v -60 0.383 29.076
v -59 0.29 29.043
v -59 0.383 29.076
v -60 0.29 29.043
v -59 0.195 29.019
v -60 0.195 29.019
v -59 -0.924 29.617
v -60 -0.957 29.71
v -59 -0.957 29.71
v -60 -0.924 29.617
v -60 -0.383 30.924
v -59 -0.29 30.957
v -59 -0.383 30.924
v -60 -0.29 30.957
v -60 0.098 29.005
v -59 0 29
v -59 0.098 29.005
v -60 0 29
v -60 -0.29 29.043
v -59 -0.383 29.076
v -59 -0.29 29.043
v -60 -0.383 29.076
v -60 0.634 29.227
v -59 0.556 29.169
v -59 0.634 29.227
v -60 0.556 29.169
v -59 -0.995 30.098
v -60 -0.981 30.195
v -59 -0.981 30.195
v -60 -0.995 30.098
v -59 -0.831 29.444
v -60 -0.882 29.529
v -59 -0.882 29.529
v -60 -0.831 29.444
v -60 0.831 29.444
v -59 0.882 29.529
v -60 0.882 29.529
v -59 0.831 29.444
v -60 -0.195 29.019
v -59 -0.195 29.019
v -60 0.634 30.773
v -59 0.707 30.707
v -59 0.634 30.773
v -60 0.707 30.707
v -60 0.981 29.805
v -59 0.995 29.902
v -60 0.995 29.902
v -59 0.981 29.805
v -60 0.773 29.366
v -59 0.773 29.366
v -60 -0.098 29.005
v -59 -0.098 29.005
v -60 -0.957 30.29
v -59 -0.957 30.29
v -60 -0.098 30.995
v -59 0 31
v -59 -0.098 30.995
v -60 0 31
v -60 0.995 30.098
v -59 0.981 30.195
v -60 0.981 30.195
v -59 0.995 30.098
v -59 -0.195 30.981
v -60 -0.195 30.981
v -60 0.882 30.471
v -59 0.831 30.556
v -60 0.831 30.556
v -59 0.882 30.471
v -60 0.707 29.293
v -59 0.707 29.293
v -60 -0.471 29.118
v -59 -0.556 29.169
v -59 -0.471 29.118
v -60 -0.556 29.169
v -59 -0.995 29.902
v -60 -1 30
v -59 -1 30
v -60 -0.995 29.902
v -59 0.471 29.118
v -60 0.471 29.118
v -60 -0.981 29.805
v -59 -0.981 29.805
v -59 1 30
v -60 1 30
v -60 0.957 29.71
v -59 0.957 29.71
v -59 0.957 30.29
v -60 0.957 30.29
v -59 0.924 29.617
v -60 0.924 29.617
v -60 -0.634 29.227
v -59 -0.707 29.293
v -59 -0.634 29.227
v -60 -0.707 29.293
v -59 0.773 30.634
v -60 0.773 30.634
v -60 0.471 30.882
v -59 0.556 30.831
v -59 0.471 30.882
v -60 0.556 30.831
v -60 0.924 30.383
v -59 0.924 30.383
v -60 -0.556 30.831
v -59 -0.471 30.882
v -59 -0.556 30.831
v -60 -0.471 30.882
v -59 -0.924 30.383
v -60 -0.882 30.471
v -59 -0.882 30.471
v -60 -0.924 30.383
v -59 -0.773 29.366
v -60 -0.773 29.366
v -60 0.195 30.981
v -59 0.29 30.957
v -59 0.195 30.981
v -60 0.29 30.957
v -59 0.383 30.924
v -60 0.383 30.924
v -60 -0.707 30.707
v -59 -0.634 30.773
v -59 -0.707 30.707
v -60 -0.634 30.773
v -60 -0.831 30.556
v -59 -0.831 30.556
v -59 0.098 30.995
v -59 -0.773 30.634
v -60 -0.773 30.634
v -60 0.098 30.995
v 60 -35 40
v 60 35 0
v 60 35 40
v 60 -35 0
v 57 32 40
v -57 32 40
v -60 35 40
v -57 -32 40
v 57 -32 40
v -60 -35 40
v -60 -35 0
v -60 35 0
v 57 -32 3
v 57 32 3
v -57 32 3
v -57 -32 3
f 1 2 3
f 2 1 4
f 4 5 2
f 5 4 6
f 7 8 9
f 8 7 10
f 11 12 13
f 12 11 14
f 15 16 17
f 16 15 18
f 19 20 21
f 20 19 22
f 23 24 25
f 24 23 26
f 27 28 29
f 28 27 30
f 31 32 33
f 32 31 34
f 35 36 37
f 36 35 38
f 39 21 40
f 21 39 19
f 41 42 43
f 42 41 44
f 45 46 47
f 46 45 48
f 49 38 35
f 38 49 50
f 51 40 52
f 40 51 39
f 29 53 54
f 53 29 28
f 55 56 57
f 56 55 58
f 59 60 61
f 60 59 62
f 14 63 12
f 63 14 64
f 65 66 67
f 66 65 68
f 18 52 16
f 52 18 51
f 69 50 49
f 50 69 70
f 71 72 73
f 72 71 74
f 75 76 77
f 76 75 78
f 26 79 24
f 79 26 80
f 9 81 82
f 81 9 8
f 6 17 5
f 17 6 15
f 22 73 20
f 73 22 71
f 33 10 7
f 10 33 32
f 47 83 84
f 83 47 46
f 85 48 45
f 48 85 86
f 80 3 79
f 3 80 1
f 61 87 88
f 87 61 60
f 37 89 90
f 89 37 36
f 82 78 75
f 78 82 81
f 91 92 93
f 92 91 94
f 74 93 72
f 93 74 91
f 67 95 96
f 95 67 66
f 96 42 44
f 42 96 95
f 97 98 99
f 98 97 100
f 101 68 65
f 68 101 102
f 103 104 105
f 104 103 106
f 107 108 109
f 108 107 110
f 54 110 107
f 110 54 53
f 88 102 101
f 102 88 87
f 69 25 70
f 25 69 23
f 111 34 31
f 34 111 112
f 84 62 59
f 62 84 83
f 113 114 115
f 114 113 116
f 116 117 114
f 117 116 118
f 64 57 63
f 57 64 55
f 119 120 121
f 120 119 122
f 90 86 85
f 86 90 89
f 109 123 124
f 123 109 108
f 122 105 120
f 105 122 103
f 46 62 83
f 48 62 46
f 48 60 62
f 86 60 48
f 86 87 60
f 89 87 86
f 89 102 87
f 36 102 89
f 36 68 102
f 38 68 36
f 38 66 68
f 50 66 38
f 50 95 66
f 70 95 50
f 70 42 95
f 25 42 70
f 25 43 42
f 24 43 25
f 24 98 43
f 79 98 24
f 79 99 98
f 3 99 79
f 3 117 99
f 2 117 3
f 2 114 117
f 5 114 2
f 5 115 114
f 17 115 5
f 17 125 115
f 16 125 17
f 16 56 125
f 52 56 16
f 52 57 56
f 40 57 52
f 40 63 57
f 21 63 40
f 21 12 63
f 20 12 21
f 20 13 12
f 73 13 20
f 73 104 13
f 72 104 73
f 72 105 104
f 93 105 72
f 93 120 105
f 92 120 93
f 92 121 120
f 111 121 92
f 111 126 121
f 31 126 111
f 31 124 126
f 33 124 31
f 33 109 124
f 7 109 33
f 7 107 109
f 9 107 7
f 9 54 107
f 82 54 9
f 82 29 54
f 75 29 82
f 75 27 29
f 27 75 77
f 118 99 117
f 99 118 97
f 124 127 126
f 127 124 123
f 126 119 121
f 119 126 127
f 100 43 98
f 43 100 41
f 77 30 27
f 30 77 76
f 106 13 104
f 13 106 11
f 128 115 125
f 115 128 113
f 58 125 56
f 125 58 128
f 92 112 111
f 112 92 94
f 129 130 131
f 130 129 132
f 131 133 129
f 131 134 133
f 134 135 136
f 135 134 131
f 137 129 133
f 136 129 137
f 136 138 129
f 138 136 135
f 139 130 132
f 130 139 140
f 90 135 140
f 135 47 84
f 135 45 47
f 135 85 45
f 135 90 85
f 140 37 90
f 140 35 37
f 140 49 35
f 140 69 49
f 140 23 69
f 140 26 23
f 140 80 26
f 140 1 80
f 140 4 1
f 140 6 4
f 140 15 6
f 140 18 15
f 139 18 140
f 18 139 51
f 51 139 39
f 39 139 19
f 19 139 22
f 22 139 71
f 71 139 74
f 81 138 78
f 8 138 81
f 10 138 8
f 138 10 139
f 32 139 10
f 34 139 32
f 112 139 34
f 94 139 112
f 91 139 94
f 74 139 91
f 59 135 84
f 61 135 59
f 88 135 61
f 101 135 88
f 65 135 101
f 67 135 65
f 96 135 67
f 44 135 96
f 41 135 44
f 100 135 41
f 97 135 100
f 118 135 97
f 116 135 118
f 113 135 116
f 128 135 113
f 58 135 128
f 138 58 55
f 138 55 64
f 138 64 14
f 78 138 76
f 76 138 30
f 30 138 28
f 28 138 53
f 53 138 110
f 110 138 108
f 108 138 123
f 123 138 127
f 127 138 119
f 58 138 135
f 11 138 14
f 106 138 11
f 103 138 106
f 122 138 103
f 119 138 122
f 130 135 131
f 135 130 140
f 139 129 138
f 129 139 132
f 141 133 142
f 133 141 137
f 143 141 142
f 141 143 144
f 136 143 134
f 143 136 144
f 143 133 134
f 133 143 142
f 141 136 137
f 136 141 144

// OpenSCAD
// Buffer tank for a mini horizontal gel-electrophoresis box
// Print orientation: rests on XY plane at z = 0, builds upward (+Z), centred on origin in X and Y.

// ---- Tank outer dimensions (measured with calipers) ----
L = 120;   // outer length along X
W = 70;    // outer width  along Y
H = 40;    // outer height along Z

// ---- Wall / floor thickness ----
t = 3;     // uniform wall and floor thickness

// ---- Inner cavity dimensions (derived) ----
Li = L - 2*t;   // inner length along X  = 114
Wi = W - 2*t;   // inner width  along Y  = 64
Hi = H - t;     // inner height along Z  = 37

// ---- Raised gel-tray platform ----
pl = 60;   // platform length along X (centred)
ph = 10;   // platform height above the inner floor (top at z = 13)

// ---- Electrode-wire holes (through each X end wall) ----
hr = 1;    // hole radius (2 mm diameter)
hz = 30;   // hole centre height above z = 0

$fn = 64;  // smooth circular holes

// ---- Build the tank ----
difference() {
    // Outer solid block
    translate([-L/2, -W/2, 0])
        cube([L, W, H]);

    // Open-top inner cavity (extends 1 mm past the top face so the top is fully open)
    translate([-Li/2, -Wi/2, t])
        cube([Li, Wi, Hi + 1]);

    // Raised gel-tray platform (solid, spans full inner width, centred in X)
    translate([-pl/2, -Wi/2, t])
        cube([pl, Wi, ph]);

    // Horizontal electrode-wire holes through both X end walls
    for (sx = [-1, 1]) {
        translate([sx * (L/2 + 1), 0, hz])
            rotate([0, 90, 0])
                cylinder(h = 2, r = hr, $fn = $fn);
    }
}
